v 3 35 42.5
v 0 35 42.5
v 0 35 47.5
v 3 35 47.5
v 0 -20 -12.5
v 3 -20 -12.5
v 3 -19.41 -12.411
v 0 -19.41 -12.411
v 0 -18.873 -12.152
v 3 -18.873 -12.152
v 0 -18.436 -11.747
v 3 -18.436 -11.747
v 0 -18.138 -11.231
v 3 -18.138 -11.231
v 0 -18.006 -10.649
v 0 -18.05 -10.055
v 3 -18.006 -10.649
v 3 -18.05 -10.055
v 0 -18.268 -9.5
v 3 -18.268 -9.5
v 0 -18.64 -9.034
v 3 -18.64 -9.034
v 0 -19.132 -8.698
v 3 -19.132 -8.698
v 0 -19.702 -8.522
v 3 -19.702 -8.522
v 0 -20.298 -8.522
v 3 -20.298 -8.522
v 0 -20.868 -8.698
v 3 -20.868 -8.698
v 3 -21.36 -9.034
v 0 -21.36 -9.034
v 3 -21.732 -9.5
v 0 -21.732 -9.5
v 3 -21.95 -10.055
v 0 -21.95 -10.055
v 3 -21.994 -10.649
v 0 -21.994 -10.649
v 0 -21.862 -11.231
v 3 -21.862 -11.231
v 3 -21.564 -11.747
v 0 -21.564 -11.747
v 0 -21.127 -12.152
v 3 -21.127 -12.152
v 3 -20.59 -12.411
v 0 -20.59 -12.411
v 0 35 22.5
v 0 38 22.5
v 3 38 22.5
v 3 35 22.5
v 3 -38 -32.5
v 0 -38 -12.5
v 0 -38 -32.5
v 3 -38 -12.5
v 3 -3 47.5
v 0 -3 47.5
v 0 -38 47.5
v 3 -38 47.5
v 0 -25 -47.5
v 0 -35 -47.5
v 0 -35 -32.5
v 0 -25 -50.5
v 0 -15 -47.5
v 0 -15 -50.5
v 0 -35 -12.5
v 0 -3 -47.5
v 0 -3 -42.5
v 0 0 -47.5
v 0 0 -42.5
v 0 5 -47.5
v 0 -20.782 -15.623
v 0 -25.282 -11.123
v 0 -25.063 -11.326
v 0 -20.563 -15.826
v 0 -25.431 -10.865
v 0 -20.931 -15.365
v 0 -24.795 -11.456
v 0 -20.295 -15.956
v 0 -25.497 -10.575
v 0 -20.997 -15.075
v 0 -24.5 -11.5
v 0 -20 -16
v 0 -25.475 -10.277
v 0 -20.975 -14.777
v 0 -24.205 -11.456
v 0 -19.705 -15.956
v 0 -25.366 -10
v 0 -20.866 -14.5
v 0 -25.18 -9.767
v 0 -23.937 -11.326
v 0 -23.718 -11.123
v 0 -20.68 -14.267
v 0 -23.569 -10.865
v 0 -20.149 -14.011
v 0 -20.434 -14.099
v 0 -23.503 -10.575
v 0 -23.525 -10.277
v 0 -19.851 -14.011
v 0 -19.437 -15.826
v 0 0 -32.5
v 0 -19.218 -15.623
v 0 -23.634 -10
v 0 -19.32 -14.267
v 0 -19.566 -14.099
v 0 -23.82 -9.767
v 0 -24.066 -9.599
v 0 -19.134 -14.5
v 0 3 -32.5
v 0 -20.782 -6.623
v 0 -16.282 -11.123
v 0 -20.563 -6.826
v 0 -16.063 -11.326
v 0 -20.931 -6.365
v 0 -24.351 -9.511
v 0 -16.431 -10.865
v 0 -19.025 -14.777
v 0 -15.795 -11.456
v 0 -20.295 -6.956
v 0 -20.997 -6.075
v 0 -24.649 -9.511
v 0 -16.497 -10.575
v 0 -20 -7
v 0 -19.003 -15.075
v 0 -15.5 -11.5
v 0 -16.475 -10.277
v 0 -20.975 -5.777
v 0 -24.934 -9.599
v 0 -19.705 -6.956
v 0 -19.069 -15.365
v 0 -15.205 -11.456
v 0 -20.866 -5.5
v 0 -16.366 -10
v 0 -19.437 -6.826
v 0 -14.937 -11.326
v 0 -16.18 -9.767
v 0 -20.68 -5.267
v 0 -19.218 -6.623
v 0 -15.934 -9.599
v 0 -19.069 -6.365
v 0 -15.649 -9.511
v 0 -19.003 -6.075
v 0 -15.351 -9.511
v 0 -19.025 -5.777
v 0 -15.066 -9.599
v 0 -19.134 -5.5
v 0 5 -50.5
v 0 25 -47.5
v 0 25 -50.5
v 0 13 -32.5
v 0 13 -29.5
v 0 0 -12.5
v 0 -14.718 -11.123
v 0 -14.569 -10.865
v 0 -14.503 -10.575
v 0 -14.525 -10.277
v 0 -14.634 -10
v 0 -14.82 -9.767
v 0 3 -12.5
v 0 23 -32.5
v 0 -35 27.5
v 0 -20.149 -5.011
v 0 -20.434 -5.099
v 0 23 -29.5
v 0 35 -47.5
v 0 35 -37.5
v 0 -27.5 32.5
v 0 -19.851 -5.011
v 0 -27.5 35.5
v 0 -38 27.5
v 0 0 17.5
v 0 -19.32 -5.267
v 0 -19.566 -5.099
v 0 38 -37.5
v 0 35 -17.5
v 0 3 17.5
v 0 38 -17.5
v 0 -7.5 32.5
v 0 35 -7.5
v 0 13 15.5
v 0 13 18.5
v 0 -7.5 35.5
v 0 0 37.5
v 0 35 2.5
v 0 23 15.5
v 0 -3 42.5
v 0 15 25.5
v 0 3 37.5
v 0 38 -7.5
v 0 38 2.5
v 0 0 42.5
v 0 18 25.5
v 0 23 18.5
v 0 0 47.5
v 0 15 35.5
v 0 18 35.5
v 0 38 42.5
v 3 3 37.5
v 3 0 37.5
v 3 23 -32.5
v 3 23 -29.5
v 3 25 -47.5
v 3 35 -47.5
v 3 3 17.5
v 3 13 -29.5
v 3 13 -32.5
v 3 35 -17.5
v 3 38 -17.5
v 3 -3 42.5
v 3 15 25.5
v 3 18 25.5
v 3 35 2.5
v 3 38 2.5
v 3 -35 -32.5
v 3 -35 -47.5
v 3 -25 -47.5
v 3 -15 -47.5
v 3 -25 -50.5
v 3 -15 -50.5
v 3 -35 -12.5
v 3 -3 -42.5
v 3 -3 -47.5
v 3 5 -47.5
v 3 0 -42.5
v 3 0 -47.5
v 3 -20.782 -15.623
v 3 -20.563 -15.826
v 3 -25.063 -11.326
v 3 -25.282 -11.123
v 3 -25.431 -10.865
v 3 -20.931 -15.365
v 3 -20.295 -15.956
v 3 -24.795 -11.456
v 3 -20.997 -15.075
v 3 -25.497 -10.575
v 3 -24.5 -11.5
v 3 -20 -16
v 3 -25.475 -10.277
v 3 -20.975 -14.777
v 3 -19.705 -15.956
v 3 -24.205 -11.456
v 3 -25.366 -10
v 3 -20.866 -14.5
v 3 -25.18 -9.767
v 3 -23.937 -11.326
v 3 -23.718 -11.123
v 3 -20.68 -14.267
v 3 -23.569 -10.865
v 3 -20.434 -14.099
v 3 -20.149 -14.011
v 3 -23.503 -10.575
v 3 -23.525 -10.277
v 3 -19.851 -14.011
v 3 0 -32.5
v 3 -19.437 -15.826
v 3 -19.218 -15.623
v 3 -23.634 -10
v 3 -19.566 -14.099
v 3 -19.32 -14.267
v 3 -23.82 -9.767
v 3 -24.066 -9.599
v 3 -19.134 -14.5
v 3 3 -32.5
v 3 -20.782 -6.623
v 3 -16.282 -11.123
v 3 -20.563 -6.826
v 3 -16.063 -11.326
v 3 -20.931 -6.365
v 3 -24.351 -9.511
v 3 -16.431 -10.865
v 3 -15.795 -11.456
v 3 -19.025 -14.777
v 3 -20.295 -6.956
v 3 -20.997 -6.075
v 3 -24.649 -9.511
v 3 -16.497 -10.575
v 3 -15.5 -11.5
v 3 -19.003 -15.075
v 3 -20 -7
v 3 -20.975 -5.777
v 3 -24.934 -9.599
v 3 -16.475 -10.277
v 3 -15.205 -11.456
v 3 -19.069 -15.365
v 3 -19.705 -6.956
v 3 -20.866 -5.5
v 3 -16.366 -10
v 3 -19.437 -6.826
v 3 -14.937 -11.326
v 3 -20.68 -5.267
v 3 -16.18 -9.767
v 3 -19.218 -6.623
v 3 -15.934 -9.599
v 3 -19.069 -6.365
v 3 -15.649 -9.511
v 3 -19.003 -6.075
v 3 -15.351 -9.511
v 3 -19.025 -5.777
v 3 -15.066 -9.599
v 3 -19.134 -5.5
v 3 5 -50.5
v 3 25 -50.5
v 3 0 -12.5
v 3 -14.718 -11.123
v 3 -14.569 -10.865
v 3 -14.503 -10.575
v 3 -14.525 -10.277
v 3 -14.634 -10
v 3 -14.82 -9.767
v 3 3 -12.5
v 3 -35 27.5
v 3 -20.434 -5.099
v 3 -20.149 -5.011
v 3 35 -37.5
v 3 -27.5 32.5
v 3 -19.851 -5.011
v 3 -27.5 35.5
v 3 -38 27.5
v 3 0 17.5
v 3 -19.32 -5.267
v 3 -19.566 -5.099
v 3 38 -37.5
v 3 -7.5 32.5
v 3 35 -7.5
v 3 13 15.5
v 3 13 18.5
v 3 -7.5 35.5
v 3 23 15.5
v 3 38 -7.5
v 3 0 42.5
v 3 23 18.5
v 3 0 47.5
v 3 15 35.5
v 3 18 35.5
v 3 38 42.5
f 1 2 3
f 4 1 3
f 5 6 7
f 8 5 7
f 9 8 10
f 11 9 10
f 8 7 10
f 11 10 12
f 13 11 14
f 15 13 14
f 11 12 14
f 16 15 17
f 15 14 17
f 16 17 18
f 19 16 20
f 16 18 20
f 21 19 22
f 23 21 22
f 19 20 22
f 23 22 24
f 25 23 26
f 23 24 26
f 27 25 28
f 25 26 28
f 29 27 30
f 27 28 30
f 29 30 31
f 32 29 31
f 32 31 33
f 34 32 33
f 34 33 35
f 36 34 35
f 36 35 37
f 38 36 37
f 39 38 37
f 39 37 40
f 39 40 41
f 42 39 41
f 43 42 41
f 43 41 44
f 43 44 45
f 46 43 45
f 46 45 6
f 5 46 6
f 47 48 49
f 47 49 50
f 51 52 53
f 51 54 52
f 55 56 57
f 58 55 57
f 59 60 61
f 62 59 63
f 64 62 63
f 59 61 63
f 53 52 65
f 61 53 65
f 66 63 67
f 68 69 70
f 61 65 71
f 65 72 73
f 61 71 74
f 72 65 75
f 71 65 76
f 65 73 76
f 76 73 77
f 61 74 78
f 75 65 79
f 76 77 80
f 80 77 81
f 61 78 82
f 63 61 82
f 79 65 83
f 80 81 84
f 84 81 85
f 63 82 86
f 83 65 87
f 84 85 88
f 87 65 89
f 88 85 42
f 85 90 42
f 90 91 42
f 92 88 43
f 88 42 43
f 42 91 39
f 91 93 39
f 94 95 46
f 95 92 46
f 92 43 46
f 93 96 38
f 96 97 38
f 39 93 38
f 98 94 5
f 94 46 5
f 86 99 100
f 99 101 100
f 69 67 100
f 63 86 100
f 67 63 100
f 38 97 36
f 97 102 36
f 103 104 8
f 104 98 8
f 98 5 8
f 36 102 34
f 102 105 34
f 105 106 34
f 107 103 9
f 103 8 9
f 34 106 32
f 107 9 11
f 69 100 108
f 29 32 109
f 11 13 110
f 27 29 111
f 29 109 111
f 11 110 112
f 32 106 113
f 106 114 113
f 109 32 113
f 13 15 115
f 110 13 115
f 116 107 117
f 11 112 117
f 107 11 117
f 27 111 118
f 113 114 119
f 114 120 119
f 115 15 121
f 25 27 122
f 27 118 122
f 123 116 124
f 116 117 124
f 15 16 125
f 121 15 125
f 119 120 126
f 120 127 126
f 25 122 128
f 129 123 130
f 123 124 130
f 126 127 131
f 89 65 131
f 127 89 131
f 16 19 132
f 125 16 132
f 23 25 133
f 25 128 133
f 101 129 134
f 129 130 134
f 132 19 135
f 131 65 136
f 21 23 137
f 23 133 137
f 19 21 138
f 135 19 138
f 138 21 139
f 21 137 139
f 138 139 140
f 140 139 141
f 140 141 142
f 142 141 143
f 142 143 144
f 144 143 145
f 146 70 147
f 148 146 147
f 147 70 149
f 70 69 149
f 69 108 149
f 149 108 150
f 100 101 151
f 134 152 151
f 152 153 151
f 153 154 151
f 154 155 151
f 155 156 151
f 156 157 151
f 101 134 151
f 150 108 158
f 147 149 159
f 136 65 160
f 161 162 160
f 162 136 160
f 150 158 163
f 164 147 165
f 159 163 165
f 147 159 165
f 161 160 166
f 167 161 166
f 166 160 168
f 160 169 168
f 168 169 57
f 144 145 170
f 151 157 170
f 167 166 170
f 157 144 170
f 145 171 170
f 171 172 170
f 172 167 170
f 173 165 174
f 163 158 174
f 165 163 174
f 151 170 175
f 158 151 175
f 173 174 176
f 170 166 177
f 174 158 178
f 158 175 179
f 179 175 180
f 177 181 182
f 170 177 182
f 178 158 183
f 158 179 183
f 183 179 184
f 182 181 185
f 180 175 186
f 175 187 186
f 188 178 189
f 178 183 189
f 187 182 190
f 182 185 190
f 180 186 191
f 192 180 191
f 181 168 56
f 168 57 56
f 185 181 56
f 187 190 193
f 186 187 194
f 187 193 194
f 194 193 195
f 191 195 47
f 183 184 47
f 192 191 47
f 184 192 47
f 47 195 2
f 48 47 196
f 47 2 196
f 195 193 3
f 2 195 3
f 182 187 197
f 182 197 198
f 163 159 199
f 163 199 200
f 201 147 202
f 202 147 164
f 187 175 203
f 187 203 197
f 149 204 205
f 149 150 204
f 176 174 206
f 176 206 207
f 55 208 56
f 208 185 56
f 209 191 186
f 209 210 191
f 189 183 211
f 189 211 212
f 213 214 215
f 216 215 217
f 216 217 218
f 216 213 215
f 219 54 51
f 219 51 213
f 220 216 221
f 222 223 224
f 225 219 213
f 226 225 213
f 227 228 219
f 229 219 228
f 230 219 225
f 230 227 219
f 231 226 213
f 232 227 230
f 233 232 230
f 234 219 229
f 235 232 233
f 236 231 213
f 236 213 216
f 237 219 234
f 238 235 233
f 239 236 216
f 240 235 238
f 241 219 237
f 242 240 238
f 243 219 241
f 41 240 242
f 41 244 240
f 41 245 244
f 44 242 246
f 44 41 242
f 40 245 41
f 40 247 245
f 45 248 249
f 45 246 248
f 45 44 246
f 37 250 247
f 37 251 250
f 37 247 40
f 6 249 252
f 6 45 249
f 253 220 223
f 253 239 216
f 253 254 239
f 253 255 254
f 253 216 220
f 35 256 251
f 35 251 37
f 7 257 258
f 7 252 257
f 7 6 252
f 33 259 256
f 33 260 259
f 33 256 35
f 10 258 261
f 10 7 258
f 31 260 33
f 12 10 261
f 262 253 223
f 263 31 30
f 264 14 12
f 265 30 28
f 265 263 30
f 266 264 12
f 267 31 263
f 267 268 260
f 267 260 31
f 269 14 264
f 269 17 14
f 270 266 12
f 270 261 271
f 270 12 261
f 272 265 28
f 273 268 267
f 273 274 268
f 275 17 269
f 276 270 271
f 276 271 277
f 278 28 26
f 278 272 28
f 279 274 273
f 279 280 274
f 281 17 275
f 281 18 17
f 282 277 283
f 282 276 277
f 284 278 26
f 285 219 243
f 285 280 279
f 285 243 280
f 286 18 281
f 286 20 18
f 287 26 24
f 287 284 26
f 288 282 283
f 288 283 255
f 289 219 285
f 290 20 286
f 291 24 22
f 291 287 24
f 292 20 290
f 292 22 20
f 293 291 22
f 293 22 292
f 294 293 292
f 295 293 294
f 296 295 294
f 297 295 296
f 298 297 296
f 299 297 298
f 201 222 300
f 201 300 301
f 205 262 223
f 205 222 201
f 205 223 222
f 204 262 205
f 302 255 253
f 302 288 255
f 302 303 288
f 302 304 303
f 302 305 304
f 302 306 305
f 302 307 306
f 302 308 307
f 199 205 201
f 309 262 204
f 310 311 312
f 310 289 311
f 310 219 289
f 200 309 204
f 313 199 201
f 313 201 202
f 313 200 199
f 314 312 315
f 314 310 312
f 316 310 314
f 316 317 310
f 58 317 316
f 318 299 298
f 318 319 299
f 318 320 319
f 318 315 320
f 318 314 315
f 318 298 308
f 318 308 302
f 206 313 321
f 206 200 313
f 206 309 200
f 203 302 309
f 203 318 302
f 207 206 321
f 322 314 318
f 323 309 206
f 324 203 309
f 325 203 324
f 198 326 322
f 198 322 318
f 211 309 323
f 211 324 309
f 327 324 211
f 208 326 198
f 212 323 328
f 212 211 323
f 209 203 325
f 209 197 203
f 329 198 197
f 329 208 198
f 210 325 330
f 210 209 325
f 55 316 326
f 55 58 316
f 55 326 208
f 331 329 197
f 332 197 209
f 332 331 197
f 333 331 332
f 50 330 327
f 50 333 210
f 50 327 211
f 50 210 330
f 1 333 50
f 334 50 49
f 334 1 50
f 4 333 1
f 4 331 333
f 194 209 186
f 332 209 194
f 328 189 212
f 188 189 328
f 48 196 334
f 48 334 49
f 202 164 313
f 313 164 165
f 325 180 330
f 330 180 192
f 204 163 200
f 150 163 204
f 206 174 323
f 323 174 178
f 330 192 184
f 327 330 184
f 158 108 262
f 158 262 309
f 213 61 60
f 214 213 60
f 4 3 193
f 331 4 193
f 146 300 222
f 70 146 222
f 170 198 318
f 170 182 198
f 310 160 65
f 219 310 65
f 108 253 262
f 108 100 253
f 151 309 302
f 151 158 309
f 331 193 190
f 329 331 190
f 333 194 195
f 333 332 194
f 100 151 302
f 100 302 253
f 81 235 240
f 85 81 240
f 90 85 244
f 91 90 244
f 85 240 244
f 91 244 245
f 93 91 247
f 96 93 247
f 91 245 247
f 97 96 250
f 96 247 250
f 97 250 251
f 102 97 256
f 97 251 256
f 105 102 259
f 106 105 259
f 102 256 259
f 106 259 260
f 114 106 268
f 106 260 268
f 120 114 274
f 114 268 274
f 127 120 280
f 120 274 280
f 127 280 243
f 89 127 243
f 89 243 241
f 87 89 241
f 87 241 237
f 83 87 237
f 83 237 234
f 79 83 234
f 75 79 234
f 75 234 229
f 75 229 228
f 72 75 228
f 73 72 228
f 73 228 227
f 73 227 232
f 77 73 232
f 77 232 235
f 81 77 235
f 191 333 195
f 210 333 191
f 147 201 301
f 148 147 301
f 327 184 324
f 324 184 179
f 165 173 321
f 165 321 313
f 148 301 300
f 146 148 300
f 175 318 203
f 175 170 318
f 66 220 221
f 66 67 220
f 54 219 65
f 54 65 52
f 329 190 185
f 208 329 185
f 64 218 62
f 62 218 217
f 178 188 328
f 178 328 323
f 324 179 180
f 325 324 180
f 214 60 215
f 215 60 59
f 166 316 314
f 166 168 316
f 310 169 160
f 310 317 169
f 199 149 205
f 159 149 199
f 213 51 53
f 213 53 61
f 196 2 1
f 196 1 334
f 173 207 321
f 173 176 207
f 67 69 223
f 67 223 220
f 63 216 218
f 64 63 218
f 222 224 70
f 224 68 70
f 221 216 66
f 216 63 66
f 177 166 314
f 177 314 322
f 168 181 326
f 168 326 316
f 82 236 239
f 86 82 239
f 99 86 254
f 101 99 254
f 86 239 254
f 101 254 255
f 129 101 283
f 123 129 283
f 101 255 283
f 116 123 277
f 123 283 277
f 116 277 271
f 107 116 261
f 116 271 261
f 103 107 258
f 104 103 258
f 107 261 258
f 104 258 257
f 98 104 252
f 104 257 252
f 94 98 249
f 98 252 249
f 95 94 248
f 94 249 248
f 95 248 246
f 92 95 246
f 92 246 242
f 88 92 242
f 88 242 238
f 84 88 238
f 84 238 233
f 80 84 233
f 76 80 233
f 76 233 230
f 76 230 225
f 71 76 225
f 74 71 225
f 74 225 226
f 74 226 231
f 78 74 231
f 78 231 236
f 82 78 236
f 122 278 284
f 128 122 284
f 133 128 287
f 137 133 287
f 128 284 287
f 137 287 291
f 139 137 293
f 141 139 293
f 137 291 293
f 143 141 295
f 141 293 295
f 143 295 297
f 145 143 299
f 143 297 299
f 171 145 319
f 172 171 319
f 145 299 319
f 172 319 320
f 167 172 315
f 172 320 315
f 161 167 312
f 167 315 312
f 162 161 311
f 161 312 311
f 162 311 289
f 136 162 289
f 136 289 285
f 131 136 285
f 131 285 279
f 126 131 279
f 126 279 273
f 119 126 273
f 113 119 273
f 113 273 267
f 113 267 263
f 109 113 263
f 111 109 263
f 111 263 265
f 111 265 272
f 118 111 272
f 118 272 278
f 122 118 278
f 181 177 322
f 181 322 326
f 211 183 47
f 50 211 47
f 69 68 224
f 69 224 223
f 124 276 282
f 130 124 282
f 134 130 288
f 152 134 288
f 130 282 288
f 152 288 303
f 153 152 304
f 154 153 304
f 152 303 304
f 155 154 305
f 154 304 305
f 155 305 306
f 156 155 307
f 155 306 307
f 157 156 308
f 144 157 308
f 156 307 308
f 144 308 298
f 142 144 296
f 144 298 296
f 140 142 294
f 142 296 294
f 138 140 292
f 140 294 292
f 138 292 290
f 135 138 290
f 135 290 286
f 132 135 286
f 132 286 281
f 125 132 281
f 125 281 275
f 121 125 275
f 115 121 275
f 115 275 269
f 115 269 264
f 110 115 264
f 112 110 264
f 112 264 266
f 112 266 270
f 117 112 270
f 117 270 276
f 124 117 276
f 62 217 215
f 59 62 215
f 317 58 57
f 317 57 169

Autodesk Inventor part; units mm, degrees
ref_plane "YZ Plane" through (0, 0, 0) normal (1, 0, 0) x (0, 1, 0)
ref_plane "XZ Plane" through (0, 0, 0) normal (0, 1, 0) x (-1, 0, 0)
ref_plane "XY Plane" through (0, 0, 0) normal (0, 0, 1) x (1, 0, 0)
sketch "Sketch1" plane through (0, 0, 0) normal (1, 0, 0) x (0, 1, 0)
  line L0 (-35, -47.5) -> (35, -47.5)
  line L1 (35, -47.5) -> (35, 47.5)
  line L2 (35, 47.5) -> (-35, 47.5)
  line L3 (-35, 47.5) -> (-35, -47.5)
  line L4 (-35, -47.5) -> (35, 47.5) construction
  line L5 (35, -47.5) -> (-35, 47.5) construction
  point P0 (0, 0)
  dimension "d0" = 70
  dimension "d1" = 95
extrude "Extrusion1" add sketch "Sketch1" along normal blind 3
sketch "Sketch2" plane through (3, 0, 0) normal (1, 0, 0) x (0, 0, -1)
  line L0 (-47.5, -35) -> (47.5, -35) projected
  line L1 (32.5, -35) -> (12.5, -35)
  line L2 (12.5, -35) -> (12.5, -38)
  line L3 (12.5, -38) -> (32.5, -38)
  line L4 (32.5, -38) -> (32.5, -35)
  line L5 (-27.5, -35) -> (-47.5, -35)
  line L6 (-47.5, -35) -> (-47.5, -38)
  line L7 (-47.5, -38) -> (-27.5, -38)
  line L8 (-27.5, -38) -> (-27.5, -35)
  line L9 (47.5, -35) -> (47.5, 35) projected
  point P0 (0, 0)
  dimension "d4" = 20
  dimension "d5" = 3
  dimension "d6" = 20
  dimension "d7" = 3
  dimension "d8" = 40
  dimension "d9" = 15
extrude "Extrusion2" add sketch "Sketch2" against normal blind 3
sketch "Sketch3" plane through (3, 0, 0) normal (1, 0, 0) x (0, 0, -1)
  line L0 (47.5, -35) -> (47.5, 35) projected
  line L1 (47.5, 25) -> (50.5, 25)
  line L2 (50.5, 25) -> (50.5, 5)
  line L3 (50.5, 5) -> (47.5, 5)
  line L4 (47.5, 5) -> (47.5, 25)
  line L5 (47.5, 35) -> (-47.5, 35) projected
  line L6 (47.5, -15) -> (50.5, -15)
  line L7 (50.5, -15) -> (50.5, -25)
  line L8 (50.5, -25) -> (47.5, -25)
  line L9 (47.5, -25) -> (47.5, -15)
  line L10 (32.5, -35) -> (47.5, -35) projected
  point P0 (0, 0)
  dimension "d12" = 3
  dimension "d13" = 20
  dimension "d14" = 10
  dimension "d15" = 3
  dimension "d16" = 10
  dimension "d17" = 10
  dimension "d18" = 20
extrude "Extrusion3" add sketch "Sketch3" against normal blind 3
sketch "Sketch4" plane through (3, 0, 0) normal (1, 0, 0) x (0, 0, -1)
  line L0 (32.5, -35) -> (32.5, -38) projected
  line L1 (40.5, -38) -> (32.5, -38) projected
  line L2 (40.5, -35) -> (40.5, -38) projected
  line L3 (32.5, -35) -> (40.5, -35) projected
  line L4 (12.5, -38) -> (12.5, -35) projected
  line L5 (-19.5, -35) -> (12.5, -35) projected
  line L6 (-19.5, -35) -> (-19.5, -38) projected
  line L7 (12.5, -38) -> (-19.5, -38) projected
  circle A0 centre (10.5, -20) radius 30 construction
  circle A1 centre (10.5, -20) radius 2
  point P0 (0, 0)
  dimension "d21" = 60
  dimension "d22" = 30
  dimension "d23" = 15
  dimension "d24" = 4
extrude "Extrusion4" cut sketch "Sketch4" against normal blind 3 contours A1
sketch "Sketch5" plane through (3, 0, 0) normal (1, 0, 0) x (0, 0, -1)
  circle A0 centre (10.5, -15.5) radius 1
  circle A1 centre (10.5, -20) radius 2 projected
  circle A2 centre (6, -20) radius 1
  circle A3 centre (10.5, -24.5) radius 1
  circle A4 centre (15, -20) radius 1
  point P0 (0, 0)
  dimension "d27" = 2
  dimension "d28" = 4.5
  dimension "d31" = 360
extrude "Extrusion5" cut sketch "Sketch5" against normal blind 3 contours A0 | A2 | A3 | A4
sketch "Sketch6" plane through (0, 0, 0) normal (-1, 0, 0) x (0, 0, 1)
  line L0 (32.5, -7.5) -> (35.5, -7.5)
  line L1 (35.5, -7.5) -> (35.5, -27.5)
  line L2 (35.5, -27.5) -> (32.5, -27.5)
  line L3 (32.5, -27.5) -> (32.5, -7.5)
  line L4 (-47.5, -15) -> (-47.5, 5) projected
  line L5 (27.5, -35) -> (-12.5, -35) projected
  point P0 (0, 0)
  dimension "d35" = 3
  dimension "d36" = 20
  dimension "d37" = 80
  dimension "d38" = 7.5
extrude "Extrusion6" cut sketch "Sketch6" against normal blind 10
sketch "Sketch7" plane through (0, 0, 0) normal (-1, 0, 0) x (0, 0, 1)
  line L0 (-32.5, 3) -> (-12.5, 3)
  line L1 (-12.5, 3) -> (-12.5, 0)
  line L2 (-12.5, 0) -> (-32.5, 0)
  line L3 (-32.5, 0) -> (-32.5, 3)
  line L4 (27.5, -35) -> (-12.5, -35) projected
  line L5 (-47.5, -15) -> (-47.5, 5) projected
  line L6 (17.5, 3) -> (37.5, 3)
  line L7 (37.5, 3) -> (37.5, 0)
  line L8 (37.5, 0) -> (17.5, 0)
  line L9 (17.5, 0) -> (17.5, 3)
  point P0 (0, 0)
  dimension "d41" = 20
  dimension "d42" = 3
  dimension "d43" = 35
  dimension "d44" = 15
  dimension "d45" = 20
  dimension "d46" = 3
  dimension "d47" = 30
extrude "Extrusion7" cut sketch "Sketch7" against normal blind 10
sketch "Sketch8" plane through (0, 0, 0) normal (-1, 0, 0) x (0, 0, 1)
  line L0 (-32.5, 23) -> (-29.5, 23)
  line L1 (-29.5, 23) -> (-29.5, 13)
  line L2 (-29.5, 13) -> (-32.5, 13)
  line L3 (-32.5, 13) -> (-32.5, 23)
  line L4 (18.5, 23) -> (15.5, 23)
  line L5 (15.5, 23) -> (15.5, 13)
  line L6 (15.5, 13) -> (18.5, 13)
  line L7 (18.5, 13) -> (18.5, 23)
  line L8 (-47.5, 25) -> (-47.5, 35) projected
  line L9 (-32.5, 3) -> (-12.5, 3) projected
  point P0 (0, 0)
  dimension "d50" = 3
  dimension "d51" = 10
  dimension "d52" = 3
  dimension "d53" = 10
  dimension "d54" = 15
  dimension "d55" = 45
  dimension "d56" = 10
extrude "Extrusion8" cut sketch "Sketch8" against normal blind 3
sketch "Sketch9" plane through (3, 0, 0) normal (1, 0, 0) x (0, 0, -1)
  line L0 (-35.5, 18) -> (-25.5, 18)
  line L1 (-25.5, 18) -> (-25.5, 15)
  line L2 (-25.5, 15) -> (-35.5, 15)
  line L3 (-35.5, 15) -> (-35.5, 18)
  line L4 (-37.5, 3) -> (-17.5, 3) projected
  line L5 (-18.5, 13) -> (-18.5, 23) projected
  point P0 (0, 0)
  dimension "d59" = 10
  dimension "d60" = 12
  dimension "d61" = 3
  dimension "d62" = 7
extrude "Extrusion9" cut sketch "Sketch9" against normal blind 3
sketch "Sketch10" plane through (0, 0, 0) normal (-1, 0, 0) x (0, 0, 1)
  line L0 (-47.5, 35) -> (47.5, 35) projected
  line L1 (-37.5, 35) -> (-17.5, 35)
  line L2 (-17.5, 35) -> (-17.5, 38)
  line L3 (-17.5, 38) -> (-37.5, 38)
  line L4 (-37.5, 38) -> (-37.5, 35)
  line L5 (22.5, 35) -> (42.5, 35)
  line L6 (42.5, 35) -> (42.5, 38)
  line L7 (42.5, 38) -> (22.5, 38)
  line L8 (22.5, 38) -> (22.5, 35)
  line L9 (-7.5, 35) -> (2.5, 35)
  line L10 (2.5, 35) -> (2.5, 38)
  line L11 (2.5, 38) -> (-7.5, 38)
  line L12 (-7.5, 38) -> (-7.5, 35)
  line L13 (-47.5, 25) -> (-47.5, 35) projected
  point P0 (0, 0)
  dimension "d65" = 20
  dimension "d66" = 3
  dimension "d67" = 20
  dimension "d68" = 3
  dimension "d69" = 10
  dimension "d70" = 3
  dimension "d71" = 10
  dimension "d72" = 10
  dimension "d73" = 20
extrude "Extrusion10" add sketch "Sketch10" against normal blind 3
sketch "Sketch11" plane through (0, 0, 0) normal (-1, 0, 0) x (0, 0, 1)
  line L0 (-47.5, -15) -> (-47.5, 5) projected
  line L1 (-47.5, 0) -> (-42.5, 0)
  line L2 (-42.5, 0) -> (-42.5, -3)
  line L3 (-42.5, -3) -> (-47.5, -3)
  line L4 (-47.5, -3) -> (-47.5, 0)
  line L5 (-12.5, 0) -> (-32.5, 0) projected
  point P0 (0, 0)
  dimension "d76" = 5
  dimension "d77" = 3
extrude "Extrusion11" cut sketch "Sketch11" against normal blind 3
sketch "Sketch12" plane through (0, 0, 0) normal (-1, 0, 0) x (0, 0, 1)
  line L0 (47.5, 35) -> (47.5, -38) projected
  line L1 (47.5, 0) -> (42.5, 0)
  line L2 (42.5, 0) -> (42.5, -3)
  line L3 (42.5, -3) -> (47.5, -3)
  line L4 (47.5, -3) -> (47.5, 0)
  line L5 (37.5, 0) -> (17.5, 0) projected
  point P0 (0, 0)
  dimension "d80" = 3
  dimension "d81" = 5
extrude "Extrusion12" cut sketch "Sketch12" against normal blind 3
properties part number "Motor support"
